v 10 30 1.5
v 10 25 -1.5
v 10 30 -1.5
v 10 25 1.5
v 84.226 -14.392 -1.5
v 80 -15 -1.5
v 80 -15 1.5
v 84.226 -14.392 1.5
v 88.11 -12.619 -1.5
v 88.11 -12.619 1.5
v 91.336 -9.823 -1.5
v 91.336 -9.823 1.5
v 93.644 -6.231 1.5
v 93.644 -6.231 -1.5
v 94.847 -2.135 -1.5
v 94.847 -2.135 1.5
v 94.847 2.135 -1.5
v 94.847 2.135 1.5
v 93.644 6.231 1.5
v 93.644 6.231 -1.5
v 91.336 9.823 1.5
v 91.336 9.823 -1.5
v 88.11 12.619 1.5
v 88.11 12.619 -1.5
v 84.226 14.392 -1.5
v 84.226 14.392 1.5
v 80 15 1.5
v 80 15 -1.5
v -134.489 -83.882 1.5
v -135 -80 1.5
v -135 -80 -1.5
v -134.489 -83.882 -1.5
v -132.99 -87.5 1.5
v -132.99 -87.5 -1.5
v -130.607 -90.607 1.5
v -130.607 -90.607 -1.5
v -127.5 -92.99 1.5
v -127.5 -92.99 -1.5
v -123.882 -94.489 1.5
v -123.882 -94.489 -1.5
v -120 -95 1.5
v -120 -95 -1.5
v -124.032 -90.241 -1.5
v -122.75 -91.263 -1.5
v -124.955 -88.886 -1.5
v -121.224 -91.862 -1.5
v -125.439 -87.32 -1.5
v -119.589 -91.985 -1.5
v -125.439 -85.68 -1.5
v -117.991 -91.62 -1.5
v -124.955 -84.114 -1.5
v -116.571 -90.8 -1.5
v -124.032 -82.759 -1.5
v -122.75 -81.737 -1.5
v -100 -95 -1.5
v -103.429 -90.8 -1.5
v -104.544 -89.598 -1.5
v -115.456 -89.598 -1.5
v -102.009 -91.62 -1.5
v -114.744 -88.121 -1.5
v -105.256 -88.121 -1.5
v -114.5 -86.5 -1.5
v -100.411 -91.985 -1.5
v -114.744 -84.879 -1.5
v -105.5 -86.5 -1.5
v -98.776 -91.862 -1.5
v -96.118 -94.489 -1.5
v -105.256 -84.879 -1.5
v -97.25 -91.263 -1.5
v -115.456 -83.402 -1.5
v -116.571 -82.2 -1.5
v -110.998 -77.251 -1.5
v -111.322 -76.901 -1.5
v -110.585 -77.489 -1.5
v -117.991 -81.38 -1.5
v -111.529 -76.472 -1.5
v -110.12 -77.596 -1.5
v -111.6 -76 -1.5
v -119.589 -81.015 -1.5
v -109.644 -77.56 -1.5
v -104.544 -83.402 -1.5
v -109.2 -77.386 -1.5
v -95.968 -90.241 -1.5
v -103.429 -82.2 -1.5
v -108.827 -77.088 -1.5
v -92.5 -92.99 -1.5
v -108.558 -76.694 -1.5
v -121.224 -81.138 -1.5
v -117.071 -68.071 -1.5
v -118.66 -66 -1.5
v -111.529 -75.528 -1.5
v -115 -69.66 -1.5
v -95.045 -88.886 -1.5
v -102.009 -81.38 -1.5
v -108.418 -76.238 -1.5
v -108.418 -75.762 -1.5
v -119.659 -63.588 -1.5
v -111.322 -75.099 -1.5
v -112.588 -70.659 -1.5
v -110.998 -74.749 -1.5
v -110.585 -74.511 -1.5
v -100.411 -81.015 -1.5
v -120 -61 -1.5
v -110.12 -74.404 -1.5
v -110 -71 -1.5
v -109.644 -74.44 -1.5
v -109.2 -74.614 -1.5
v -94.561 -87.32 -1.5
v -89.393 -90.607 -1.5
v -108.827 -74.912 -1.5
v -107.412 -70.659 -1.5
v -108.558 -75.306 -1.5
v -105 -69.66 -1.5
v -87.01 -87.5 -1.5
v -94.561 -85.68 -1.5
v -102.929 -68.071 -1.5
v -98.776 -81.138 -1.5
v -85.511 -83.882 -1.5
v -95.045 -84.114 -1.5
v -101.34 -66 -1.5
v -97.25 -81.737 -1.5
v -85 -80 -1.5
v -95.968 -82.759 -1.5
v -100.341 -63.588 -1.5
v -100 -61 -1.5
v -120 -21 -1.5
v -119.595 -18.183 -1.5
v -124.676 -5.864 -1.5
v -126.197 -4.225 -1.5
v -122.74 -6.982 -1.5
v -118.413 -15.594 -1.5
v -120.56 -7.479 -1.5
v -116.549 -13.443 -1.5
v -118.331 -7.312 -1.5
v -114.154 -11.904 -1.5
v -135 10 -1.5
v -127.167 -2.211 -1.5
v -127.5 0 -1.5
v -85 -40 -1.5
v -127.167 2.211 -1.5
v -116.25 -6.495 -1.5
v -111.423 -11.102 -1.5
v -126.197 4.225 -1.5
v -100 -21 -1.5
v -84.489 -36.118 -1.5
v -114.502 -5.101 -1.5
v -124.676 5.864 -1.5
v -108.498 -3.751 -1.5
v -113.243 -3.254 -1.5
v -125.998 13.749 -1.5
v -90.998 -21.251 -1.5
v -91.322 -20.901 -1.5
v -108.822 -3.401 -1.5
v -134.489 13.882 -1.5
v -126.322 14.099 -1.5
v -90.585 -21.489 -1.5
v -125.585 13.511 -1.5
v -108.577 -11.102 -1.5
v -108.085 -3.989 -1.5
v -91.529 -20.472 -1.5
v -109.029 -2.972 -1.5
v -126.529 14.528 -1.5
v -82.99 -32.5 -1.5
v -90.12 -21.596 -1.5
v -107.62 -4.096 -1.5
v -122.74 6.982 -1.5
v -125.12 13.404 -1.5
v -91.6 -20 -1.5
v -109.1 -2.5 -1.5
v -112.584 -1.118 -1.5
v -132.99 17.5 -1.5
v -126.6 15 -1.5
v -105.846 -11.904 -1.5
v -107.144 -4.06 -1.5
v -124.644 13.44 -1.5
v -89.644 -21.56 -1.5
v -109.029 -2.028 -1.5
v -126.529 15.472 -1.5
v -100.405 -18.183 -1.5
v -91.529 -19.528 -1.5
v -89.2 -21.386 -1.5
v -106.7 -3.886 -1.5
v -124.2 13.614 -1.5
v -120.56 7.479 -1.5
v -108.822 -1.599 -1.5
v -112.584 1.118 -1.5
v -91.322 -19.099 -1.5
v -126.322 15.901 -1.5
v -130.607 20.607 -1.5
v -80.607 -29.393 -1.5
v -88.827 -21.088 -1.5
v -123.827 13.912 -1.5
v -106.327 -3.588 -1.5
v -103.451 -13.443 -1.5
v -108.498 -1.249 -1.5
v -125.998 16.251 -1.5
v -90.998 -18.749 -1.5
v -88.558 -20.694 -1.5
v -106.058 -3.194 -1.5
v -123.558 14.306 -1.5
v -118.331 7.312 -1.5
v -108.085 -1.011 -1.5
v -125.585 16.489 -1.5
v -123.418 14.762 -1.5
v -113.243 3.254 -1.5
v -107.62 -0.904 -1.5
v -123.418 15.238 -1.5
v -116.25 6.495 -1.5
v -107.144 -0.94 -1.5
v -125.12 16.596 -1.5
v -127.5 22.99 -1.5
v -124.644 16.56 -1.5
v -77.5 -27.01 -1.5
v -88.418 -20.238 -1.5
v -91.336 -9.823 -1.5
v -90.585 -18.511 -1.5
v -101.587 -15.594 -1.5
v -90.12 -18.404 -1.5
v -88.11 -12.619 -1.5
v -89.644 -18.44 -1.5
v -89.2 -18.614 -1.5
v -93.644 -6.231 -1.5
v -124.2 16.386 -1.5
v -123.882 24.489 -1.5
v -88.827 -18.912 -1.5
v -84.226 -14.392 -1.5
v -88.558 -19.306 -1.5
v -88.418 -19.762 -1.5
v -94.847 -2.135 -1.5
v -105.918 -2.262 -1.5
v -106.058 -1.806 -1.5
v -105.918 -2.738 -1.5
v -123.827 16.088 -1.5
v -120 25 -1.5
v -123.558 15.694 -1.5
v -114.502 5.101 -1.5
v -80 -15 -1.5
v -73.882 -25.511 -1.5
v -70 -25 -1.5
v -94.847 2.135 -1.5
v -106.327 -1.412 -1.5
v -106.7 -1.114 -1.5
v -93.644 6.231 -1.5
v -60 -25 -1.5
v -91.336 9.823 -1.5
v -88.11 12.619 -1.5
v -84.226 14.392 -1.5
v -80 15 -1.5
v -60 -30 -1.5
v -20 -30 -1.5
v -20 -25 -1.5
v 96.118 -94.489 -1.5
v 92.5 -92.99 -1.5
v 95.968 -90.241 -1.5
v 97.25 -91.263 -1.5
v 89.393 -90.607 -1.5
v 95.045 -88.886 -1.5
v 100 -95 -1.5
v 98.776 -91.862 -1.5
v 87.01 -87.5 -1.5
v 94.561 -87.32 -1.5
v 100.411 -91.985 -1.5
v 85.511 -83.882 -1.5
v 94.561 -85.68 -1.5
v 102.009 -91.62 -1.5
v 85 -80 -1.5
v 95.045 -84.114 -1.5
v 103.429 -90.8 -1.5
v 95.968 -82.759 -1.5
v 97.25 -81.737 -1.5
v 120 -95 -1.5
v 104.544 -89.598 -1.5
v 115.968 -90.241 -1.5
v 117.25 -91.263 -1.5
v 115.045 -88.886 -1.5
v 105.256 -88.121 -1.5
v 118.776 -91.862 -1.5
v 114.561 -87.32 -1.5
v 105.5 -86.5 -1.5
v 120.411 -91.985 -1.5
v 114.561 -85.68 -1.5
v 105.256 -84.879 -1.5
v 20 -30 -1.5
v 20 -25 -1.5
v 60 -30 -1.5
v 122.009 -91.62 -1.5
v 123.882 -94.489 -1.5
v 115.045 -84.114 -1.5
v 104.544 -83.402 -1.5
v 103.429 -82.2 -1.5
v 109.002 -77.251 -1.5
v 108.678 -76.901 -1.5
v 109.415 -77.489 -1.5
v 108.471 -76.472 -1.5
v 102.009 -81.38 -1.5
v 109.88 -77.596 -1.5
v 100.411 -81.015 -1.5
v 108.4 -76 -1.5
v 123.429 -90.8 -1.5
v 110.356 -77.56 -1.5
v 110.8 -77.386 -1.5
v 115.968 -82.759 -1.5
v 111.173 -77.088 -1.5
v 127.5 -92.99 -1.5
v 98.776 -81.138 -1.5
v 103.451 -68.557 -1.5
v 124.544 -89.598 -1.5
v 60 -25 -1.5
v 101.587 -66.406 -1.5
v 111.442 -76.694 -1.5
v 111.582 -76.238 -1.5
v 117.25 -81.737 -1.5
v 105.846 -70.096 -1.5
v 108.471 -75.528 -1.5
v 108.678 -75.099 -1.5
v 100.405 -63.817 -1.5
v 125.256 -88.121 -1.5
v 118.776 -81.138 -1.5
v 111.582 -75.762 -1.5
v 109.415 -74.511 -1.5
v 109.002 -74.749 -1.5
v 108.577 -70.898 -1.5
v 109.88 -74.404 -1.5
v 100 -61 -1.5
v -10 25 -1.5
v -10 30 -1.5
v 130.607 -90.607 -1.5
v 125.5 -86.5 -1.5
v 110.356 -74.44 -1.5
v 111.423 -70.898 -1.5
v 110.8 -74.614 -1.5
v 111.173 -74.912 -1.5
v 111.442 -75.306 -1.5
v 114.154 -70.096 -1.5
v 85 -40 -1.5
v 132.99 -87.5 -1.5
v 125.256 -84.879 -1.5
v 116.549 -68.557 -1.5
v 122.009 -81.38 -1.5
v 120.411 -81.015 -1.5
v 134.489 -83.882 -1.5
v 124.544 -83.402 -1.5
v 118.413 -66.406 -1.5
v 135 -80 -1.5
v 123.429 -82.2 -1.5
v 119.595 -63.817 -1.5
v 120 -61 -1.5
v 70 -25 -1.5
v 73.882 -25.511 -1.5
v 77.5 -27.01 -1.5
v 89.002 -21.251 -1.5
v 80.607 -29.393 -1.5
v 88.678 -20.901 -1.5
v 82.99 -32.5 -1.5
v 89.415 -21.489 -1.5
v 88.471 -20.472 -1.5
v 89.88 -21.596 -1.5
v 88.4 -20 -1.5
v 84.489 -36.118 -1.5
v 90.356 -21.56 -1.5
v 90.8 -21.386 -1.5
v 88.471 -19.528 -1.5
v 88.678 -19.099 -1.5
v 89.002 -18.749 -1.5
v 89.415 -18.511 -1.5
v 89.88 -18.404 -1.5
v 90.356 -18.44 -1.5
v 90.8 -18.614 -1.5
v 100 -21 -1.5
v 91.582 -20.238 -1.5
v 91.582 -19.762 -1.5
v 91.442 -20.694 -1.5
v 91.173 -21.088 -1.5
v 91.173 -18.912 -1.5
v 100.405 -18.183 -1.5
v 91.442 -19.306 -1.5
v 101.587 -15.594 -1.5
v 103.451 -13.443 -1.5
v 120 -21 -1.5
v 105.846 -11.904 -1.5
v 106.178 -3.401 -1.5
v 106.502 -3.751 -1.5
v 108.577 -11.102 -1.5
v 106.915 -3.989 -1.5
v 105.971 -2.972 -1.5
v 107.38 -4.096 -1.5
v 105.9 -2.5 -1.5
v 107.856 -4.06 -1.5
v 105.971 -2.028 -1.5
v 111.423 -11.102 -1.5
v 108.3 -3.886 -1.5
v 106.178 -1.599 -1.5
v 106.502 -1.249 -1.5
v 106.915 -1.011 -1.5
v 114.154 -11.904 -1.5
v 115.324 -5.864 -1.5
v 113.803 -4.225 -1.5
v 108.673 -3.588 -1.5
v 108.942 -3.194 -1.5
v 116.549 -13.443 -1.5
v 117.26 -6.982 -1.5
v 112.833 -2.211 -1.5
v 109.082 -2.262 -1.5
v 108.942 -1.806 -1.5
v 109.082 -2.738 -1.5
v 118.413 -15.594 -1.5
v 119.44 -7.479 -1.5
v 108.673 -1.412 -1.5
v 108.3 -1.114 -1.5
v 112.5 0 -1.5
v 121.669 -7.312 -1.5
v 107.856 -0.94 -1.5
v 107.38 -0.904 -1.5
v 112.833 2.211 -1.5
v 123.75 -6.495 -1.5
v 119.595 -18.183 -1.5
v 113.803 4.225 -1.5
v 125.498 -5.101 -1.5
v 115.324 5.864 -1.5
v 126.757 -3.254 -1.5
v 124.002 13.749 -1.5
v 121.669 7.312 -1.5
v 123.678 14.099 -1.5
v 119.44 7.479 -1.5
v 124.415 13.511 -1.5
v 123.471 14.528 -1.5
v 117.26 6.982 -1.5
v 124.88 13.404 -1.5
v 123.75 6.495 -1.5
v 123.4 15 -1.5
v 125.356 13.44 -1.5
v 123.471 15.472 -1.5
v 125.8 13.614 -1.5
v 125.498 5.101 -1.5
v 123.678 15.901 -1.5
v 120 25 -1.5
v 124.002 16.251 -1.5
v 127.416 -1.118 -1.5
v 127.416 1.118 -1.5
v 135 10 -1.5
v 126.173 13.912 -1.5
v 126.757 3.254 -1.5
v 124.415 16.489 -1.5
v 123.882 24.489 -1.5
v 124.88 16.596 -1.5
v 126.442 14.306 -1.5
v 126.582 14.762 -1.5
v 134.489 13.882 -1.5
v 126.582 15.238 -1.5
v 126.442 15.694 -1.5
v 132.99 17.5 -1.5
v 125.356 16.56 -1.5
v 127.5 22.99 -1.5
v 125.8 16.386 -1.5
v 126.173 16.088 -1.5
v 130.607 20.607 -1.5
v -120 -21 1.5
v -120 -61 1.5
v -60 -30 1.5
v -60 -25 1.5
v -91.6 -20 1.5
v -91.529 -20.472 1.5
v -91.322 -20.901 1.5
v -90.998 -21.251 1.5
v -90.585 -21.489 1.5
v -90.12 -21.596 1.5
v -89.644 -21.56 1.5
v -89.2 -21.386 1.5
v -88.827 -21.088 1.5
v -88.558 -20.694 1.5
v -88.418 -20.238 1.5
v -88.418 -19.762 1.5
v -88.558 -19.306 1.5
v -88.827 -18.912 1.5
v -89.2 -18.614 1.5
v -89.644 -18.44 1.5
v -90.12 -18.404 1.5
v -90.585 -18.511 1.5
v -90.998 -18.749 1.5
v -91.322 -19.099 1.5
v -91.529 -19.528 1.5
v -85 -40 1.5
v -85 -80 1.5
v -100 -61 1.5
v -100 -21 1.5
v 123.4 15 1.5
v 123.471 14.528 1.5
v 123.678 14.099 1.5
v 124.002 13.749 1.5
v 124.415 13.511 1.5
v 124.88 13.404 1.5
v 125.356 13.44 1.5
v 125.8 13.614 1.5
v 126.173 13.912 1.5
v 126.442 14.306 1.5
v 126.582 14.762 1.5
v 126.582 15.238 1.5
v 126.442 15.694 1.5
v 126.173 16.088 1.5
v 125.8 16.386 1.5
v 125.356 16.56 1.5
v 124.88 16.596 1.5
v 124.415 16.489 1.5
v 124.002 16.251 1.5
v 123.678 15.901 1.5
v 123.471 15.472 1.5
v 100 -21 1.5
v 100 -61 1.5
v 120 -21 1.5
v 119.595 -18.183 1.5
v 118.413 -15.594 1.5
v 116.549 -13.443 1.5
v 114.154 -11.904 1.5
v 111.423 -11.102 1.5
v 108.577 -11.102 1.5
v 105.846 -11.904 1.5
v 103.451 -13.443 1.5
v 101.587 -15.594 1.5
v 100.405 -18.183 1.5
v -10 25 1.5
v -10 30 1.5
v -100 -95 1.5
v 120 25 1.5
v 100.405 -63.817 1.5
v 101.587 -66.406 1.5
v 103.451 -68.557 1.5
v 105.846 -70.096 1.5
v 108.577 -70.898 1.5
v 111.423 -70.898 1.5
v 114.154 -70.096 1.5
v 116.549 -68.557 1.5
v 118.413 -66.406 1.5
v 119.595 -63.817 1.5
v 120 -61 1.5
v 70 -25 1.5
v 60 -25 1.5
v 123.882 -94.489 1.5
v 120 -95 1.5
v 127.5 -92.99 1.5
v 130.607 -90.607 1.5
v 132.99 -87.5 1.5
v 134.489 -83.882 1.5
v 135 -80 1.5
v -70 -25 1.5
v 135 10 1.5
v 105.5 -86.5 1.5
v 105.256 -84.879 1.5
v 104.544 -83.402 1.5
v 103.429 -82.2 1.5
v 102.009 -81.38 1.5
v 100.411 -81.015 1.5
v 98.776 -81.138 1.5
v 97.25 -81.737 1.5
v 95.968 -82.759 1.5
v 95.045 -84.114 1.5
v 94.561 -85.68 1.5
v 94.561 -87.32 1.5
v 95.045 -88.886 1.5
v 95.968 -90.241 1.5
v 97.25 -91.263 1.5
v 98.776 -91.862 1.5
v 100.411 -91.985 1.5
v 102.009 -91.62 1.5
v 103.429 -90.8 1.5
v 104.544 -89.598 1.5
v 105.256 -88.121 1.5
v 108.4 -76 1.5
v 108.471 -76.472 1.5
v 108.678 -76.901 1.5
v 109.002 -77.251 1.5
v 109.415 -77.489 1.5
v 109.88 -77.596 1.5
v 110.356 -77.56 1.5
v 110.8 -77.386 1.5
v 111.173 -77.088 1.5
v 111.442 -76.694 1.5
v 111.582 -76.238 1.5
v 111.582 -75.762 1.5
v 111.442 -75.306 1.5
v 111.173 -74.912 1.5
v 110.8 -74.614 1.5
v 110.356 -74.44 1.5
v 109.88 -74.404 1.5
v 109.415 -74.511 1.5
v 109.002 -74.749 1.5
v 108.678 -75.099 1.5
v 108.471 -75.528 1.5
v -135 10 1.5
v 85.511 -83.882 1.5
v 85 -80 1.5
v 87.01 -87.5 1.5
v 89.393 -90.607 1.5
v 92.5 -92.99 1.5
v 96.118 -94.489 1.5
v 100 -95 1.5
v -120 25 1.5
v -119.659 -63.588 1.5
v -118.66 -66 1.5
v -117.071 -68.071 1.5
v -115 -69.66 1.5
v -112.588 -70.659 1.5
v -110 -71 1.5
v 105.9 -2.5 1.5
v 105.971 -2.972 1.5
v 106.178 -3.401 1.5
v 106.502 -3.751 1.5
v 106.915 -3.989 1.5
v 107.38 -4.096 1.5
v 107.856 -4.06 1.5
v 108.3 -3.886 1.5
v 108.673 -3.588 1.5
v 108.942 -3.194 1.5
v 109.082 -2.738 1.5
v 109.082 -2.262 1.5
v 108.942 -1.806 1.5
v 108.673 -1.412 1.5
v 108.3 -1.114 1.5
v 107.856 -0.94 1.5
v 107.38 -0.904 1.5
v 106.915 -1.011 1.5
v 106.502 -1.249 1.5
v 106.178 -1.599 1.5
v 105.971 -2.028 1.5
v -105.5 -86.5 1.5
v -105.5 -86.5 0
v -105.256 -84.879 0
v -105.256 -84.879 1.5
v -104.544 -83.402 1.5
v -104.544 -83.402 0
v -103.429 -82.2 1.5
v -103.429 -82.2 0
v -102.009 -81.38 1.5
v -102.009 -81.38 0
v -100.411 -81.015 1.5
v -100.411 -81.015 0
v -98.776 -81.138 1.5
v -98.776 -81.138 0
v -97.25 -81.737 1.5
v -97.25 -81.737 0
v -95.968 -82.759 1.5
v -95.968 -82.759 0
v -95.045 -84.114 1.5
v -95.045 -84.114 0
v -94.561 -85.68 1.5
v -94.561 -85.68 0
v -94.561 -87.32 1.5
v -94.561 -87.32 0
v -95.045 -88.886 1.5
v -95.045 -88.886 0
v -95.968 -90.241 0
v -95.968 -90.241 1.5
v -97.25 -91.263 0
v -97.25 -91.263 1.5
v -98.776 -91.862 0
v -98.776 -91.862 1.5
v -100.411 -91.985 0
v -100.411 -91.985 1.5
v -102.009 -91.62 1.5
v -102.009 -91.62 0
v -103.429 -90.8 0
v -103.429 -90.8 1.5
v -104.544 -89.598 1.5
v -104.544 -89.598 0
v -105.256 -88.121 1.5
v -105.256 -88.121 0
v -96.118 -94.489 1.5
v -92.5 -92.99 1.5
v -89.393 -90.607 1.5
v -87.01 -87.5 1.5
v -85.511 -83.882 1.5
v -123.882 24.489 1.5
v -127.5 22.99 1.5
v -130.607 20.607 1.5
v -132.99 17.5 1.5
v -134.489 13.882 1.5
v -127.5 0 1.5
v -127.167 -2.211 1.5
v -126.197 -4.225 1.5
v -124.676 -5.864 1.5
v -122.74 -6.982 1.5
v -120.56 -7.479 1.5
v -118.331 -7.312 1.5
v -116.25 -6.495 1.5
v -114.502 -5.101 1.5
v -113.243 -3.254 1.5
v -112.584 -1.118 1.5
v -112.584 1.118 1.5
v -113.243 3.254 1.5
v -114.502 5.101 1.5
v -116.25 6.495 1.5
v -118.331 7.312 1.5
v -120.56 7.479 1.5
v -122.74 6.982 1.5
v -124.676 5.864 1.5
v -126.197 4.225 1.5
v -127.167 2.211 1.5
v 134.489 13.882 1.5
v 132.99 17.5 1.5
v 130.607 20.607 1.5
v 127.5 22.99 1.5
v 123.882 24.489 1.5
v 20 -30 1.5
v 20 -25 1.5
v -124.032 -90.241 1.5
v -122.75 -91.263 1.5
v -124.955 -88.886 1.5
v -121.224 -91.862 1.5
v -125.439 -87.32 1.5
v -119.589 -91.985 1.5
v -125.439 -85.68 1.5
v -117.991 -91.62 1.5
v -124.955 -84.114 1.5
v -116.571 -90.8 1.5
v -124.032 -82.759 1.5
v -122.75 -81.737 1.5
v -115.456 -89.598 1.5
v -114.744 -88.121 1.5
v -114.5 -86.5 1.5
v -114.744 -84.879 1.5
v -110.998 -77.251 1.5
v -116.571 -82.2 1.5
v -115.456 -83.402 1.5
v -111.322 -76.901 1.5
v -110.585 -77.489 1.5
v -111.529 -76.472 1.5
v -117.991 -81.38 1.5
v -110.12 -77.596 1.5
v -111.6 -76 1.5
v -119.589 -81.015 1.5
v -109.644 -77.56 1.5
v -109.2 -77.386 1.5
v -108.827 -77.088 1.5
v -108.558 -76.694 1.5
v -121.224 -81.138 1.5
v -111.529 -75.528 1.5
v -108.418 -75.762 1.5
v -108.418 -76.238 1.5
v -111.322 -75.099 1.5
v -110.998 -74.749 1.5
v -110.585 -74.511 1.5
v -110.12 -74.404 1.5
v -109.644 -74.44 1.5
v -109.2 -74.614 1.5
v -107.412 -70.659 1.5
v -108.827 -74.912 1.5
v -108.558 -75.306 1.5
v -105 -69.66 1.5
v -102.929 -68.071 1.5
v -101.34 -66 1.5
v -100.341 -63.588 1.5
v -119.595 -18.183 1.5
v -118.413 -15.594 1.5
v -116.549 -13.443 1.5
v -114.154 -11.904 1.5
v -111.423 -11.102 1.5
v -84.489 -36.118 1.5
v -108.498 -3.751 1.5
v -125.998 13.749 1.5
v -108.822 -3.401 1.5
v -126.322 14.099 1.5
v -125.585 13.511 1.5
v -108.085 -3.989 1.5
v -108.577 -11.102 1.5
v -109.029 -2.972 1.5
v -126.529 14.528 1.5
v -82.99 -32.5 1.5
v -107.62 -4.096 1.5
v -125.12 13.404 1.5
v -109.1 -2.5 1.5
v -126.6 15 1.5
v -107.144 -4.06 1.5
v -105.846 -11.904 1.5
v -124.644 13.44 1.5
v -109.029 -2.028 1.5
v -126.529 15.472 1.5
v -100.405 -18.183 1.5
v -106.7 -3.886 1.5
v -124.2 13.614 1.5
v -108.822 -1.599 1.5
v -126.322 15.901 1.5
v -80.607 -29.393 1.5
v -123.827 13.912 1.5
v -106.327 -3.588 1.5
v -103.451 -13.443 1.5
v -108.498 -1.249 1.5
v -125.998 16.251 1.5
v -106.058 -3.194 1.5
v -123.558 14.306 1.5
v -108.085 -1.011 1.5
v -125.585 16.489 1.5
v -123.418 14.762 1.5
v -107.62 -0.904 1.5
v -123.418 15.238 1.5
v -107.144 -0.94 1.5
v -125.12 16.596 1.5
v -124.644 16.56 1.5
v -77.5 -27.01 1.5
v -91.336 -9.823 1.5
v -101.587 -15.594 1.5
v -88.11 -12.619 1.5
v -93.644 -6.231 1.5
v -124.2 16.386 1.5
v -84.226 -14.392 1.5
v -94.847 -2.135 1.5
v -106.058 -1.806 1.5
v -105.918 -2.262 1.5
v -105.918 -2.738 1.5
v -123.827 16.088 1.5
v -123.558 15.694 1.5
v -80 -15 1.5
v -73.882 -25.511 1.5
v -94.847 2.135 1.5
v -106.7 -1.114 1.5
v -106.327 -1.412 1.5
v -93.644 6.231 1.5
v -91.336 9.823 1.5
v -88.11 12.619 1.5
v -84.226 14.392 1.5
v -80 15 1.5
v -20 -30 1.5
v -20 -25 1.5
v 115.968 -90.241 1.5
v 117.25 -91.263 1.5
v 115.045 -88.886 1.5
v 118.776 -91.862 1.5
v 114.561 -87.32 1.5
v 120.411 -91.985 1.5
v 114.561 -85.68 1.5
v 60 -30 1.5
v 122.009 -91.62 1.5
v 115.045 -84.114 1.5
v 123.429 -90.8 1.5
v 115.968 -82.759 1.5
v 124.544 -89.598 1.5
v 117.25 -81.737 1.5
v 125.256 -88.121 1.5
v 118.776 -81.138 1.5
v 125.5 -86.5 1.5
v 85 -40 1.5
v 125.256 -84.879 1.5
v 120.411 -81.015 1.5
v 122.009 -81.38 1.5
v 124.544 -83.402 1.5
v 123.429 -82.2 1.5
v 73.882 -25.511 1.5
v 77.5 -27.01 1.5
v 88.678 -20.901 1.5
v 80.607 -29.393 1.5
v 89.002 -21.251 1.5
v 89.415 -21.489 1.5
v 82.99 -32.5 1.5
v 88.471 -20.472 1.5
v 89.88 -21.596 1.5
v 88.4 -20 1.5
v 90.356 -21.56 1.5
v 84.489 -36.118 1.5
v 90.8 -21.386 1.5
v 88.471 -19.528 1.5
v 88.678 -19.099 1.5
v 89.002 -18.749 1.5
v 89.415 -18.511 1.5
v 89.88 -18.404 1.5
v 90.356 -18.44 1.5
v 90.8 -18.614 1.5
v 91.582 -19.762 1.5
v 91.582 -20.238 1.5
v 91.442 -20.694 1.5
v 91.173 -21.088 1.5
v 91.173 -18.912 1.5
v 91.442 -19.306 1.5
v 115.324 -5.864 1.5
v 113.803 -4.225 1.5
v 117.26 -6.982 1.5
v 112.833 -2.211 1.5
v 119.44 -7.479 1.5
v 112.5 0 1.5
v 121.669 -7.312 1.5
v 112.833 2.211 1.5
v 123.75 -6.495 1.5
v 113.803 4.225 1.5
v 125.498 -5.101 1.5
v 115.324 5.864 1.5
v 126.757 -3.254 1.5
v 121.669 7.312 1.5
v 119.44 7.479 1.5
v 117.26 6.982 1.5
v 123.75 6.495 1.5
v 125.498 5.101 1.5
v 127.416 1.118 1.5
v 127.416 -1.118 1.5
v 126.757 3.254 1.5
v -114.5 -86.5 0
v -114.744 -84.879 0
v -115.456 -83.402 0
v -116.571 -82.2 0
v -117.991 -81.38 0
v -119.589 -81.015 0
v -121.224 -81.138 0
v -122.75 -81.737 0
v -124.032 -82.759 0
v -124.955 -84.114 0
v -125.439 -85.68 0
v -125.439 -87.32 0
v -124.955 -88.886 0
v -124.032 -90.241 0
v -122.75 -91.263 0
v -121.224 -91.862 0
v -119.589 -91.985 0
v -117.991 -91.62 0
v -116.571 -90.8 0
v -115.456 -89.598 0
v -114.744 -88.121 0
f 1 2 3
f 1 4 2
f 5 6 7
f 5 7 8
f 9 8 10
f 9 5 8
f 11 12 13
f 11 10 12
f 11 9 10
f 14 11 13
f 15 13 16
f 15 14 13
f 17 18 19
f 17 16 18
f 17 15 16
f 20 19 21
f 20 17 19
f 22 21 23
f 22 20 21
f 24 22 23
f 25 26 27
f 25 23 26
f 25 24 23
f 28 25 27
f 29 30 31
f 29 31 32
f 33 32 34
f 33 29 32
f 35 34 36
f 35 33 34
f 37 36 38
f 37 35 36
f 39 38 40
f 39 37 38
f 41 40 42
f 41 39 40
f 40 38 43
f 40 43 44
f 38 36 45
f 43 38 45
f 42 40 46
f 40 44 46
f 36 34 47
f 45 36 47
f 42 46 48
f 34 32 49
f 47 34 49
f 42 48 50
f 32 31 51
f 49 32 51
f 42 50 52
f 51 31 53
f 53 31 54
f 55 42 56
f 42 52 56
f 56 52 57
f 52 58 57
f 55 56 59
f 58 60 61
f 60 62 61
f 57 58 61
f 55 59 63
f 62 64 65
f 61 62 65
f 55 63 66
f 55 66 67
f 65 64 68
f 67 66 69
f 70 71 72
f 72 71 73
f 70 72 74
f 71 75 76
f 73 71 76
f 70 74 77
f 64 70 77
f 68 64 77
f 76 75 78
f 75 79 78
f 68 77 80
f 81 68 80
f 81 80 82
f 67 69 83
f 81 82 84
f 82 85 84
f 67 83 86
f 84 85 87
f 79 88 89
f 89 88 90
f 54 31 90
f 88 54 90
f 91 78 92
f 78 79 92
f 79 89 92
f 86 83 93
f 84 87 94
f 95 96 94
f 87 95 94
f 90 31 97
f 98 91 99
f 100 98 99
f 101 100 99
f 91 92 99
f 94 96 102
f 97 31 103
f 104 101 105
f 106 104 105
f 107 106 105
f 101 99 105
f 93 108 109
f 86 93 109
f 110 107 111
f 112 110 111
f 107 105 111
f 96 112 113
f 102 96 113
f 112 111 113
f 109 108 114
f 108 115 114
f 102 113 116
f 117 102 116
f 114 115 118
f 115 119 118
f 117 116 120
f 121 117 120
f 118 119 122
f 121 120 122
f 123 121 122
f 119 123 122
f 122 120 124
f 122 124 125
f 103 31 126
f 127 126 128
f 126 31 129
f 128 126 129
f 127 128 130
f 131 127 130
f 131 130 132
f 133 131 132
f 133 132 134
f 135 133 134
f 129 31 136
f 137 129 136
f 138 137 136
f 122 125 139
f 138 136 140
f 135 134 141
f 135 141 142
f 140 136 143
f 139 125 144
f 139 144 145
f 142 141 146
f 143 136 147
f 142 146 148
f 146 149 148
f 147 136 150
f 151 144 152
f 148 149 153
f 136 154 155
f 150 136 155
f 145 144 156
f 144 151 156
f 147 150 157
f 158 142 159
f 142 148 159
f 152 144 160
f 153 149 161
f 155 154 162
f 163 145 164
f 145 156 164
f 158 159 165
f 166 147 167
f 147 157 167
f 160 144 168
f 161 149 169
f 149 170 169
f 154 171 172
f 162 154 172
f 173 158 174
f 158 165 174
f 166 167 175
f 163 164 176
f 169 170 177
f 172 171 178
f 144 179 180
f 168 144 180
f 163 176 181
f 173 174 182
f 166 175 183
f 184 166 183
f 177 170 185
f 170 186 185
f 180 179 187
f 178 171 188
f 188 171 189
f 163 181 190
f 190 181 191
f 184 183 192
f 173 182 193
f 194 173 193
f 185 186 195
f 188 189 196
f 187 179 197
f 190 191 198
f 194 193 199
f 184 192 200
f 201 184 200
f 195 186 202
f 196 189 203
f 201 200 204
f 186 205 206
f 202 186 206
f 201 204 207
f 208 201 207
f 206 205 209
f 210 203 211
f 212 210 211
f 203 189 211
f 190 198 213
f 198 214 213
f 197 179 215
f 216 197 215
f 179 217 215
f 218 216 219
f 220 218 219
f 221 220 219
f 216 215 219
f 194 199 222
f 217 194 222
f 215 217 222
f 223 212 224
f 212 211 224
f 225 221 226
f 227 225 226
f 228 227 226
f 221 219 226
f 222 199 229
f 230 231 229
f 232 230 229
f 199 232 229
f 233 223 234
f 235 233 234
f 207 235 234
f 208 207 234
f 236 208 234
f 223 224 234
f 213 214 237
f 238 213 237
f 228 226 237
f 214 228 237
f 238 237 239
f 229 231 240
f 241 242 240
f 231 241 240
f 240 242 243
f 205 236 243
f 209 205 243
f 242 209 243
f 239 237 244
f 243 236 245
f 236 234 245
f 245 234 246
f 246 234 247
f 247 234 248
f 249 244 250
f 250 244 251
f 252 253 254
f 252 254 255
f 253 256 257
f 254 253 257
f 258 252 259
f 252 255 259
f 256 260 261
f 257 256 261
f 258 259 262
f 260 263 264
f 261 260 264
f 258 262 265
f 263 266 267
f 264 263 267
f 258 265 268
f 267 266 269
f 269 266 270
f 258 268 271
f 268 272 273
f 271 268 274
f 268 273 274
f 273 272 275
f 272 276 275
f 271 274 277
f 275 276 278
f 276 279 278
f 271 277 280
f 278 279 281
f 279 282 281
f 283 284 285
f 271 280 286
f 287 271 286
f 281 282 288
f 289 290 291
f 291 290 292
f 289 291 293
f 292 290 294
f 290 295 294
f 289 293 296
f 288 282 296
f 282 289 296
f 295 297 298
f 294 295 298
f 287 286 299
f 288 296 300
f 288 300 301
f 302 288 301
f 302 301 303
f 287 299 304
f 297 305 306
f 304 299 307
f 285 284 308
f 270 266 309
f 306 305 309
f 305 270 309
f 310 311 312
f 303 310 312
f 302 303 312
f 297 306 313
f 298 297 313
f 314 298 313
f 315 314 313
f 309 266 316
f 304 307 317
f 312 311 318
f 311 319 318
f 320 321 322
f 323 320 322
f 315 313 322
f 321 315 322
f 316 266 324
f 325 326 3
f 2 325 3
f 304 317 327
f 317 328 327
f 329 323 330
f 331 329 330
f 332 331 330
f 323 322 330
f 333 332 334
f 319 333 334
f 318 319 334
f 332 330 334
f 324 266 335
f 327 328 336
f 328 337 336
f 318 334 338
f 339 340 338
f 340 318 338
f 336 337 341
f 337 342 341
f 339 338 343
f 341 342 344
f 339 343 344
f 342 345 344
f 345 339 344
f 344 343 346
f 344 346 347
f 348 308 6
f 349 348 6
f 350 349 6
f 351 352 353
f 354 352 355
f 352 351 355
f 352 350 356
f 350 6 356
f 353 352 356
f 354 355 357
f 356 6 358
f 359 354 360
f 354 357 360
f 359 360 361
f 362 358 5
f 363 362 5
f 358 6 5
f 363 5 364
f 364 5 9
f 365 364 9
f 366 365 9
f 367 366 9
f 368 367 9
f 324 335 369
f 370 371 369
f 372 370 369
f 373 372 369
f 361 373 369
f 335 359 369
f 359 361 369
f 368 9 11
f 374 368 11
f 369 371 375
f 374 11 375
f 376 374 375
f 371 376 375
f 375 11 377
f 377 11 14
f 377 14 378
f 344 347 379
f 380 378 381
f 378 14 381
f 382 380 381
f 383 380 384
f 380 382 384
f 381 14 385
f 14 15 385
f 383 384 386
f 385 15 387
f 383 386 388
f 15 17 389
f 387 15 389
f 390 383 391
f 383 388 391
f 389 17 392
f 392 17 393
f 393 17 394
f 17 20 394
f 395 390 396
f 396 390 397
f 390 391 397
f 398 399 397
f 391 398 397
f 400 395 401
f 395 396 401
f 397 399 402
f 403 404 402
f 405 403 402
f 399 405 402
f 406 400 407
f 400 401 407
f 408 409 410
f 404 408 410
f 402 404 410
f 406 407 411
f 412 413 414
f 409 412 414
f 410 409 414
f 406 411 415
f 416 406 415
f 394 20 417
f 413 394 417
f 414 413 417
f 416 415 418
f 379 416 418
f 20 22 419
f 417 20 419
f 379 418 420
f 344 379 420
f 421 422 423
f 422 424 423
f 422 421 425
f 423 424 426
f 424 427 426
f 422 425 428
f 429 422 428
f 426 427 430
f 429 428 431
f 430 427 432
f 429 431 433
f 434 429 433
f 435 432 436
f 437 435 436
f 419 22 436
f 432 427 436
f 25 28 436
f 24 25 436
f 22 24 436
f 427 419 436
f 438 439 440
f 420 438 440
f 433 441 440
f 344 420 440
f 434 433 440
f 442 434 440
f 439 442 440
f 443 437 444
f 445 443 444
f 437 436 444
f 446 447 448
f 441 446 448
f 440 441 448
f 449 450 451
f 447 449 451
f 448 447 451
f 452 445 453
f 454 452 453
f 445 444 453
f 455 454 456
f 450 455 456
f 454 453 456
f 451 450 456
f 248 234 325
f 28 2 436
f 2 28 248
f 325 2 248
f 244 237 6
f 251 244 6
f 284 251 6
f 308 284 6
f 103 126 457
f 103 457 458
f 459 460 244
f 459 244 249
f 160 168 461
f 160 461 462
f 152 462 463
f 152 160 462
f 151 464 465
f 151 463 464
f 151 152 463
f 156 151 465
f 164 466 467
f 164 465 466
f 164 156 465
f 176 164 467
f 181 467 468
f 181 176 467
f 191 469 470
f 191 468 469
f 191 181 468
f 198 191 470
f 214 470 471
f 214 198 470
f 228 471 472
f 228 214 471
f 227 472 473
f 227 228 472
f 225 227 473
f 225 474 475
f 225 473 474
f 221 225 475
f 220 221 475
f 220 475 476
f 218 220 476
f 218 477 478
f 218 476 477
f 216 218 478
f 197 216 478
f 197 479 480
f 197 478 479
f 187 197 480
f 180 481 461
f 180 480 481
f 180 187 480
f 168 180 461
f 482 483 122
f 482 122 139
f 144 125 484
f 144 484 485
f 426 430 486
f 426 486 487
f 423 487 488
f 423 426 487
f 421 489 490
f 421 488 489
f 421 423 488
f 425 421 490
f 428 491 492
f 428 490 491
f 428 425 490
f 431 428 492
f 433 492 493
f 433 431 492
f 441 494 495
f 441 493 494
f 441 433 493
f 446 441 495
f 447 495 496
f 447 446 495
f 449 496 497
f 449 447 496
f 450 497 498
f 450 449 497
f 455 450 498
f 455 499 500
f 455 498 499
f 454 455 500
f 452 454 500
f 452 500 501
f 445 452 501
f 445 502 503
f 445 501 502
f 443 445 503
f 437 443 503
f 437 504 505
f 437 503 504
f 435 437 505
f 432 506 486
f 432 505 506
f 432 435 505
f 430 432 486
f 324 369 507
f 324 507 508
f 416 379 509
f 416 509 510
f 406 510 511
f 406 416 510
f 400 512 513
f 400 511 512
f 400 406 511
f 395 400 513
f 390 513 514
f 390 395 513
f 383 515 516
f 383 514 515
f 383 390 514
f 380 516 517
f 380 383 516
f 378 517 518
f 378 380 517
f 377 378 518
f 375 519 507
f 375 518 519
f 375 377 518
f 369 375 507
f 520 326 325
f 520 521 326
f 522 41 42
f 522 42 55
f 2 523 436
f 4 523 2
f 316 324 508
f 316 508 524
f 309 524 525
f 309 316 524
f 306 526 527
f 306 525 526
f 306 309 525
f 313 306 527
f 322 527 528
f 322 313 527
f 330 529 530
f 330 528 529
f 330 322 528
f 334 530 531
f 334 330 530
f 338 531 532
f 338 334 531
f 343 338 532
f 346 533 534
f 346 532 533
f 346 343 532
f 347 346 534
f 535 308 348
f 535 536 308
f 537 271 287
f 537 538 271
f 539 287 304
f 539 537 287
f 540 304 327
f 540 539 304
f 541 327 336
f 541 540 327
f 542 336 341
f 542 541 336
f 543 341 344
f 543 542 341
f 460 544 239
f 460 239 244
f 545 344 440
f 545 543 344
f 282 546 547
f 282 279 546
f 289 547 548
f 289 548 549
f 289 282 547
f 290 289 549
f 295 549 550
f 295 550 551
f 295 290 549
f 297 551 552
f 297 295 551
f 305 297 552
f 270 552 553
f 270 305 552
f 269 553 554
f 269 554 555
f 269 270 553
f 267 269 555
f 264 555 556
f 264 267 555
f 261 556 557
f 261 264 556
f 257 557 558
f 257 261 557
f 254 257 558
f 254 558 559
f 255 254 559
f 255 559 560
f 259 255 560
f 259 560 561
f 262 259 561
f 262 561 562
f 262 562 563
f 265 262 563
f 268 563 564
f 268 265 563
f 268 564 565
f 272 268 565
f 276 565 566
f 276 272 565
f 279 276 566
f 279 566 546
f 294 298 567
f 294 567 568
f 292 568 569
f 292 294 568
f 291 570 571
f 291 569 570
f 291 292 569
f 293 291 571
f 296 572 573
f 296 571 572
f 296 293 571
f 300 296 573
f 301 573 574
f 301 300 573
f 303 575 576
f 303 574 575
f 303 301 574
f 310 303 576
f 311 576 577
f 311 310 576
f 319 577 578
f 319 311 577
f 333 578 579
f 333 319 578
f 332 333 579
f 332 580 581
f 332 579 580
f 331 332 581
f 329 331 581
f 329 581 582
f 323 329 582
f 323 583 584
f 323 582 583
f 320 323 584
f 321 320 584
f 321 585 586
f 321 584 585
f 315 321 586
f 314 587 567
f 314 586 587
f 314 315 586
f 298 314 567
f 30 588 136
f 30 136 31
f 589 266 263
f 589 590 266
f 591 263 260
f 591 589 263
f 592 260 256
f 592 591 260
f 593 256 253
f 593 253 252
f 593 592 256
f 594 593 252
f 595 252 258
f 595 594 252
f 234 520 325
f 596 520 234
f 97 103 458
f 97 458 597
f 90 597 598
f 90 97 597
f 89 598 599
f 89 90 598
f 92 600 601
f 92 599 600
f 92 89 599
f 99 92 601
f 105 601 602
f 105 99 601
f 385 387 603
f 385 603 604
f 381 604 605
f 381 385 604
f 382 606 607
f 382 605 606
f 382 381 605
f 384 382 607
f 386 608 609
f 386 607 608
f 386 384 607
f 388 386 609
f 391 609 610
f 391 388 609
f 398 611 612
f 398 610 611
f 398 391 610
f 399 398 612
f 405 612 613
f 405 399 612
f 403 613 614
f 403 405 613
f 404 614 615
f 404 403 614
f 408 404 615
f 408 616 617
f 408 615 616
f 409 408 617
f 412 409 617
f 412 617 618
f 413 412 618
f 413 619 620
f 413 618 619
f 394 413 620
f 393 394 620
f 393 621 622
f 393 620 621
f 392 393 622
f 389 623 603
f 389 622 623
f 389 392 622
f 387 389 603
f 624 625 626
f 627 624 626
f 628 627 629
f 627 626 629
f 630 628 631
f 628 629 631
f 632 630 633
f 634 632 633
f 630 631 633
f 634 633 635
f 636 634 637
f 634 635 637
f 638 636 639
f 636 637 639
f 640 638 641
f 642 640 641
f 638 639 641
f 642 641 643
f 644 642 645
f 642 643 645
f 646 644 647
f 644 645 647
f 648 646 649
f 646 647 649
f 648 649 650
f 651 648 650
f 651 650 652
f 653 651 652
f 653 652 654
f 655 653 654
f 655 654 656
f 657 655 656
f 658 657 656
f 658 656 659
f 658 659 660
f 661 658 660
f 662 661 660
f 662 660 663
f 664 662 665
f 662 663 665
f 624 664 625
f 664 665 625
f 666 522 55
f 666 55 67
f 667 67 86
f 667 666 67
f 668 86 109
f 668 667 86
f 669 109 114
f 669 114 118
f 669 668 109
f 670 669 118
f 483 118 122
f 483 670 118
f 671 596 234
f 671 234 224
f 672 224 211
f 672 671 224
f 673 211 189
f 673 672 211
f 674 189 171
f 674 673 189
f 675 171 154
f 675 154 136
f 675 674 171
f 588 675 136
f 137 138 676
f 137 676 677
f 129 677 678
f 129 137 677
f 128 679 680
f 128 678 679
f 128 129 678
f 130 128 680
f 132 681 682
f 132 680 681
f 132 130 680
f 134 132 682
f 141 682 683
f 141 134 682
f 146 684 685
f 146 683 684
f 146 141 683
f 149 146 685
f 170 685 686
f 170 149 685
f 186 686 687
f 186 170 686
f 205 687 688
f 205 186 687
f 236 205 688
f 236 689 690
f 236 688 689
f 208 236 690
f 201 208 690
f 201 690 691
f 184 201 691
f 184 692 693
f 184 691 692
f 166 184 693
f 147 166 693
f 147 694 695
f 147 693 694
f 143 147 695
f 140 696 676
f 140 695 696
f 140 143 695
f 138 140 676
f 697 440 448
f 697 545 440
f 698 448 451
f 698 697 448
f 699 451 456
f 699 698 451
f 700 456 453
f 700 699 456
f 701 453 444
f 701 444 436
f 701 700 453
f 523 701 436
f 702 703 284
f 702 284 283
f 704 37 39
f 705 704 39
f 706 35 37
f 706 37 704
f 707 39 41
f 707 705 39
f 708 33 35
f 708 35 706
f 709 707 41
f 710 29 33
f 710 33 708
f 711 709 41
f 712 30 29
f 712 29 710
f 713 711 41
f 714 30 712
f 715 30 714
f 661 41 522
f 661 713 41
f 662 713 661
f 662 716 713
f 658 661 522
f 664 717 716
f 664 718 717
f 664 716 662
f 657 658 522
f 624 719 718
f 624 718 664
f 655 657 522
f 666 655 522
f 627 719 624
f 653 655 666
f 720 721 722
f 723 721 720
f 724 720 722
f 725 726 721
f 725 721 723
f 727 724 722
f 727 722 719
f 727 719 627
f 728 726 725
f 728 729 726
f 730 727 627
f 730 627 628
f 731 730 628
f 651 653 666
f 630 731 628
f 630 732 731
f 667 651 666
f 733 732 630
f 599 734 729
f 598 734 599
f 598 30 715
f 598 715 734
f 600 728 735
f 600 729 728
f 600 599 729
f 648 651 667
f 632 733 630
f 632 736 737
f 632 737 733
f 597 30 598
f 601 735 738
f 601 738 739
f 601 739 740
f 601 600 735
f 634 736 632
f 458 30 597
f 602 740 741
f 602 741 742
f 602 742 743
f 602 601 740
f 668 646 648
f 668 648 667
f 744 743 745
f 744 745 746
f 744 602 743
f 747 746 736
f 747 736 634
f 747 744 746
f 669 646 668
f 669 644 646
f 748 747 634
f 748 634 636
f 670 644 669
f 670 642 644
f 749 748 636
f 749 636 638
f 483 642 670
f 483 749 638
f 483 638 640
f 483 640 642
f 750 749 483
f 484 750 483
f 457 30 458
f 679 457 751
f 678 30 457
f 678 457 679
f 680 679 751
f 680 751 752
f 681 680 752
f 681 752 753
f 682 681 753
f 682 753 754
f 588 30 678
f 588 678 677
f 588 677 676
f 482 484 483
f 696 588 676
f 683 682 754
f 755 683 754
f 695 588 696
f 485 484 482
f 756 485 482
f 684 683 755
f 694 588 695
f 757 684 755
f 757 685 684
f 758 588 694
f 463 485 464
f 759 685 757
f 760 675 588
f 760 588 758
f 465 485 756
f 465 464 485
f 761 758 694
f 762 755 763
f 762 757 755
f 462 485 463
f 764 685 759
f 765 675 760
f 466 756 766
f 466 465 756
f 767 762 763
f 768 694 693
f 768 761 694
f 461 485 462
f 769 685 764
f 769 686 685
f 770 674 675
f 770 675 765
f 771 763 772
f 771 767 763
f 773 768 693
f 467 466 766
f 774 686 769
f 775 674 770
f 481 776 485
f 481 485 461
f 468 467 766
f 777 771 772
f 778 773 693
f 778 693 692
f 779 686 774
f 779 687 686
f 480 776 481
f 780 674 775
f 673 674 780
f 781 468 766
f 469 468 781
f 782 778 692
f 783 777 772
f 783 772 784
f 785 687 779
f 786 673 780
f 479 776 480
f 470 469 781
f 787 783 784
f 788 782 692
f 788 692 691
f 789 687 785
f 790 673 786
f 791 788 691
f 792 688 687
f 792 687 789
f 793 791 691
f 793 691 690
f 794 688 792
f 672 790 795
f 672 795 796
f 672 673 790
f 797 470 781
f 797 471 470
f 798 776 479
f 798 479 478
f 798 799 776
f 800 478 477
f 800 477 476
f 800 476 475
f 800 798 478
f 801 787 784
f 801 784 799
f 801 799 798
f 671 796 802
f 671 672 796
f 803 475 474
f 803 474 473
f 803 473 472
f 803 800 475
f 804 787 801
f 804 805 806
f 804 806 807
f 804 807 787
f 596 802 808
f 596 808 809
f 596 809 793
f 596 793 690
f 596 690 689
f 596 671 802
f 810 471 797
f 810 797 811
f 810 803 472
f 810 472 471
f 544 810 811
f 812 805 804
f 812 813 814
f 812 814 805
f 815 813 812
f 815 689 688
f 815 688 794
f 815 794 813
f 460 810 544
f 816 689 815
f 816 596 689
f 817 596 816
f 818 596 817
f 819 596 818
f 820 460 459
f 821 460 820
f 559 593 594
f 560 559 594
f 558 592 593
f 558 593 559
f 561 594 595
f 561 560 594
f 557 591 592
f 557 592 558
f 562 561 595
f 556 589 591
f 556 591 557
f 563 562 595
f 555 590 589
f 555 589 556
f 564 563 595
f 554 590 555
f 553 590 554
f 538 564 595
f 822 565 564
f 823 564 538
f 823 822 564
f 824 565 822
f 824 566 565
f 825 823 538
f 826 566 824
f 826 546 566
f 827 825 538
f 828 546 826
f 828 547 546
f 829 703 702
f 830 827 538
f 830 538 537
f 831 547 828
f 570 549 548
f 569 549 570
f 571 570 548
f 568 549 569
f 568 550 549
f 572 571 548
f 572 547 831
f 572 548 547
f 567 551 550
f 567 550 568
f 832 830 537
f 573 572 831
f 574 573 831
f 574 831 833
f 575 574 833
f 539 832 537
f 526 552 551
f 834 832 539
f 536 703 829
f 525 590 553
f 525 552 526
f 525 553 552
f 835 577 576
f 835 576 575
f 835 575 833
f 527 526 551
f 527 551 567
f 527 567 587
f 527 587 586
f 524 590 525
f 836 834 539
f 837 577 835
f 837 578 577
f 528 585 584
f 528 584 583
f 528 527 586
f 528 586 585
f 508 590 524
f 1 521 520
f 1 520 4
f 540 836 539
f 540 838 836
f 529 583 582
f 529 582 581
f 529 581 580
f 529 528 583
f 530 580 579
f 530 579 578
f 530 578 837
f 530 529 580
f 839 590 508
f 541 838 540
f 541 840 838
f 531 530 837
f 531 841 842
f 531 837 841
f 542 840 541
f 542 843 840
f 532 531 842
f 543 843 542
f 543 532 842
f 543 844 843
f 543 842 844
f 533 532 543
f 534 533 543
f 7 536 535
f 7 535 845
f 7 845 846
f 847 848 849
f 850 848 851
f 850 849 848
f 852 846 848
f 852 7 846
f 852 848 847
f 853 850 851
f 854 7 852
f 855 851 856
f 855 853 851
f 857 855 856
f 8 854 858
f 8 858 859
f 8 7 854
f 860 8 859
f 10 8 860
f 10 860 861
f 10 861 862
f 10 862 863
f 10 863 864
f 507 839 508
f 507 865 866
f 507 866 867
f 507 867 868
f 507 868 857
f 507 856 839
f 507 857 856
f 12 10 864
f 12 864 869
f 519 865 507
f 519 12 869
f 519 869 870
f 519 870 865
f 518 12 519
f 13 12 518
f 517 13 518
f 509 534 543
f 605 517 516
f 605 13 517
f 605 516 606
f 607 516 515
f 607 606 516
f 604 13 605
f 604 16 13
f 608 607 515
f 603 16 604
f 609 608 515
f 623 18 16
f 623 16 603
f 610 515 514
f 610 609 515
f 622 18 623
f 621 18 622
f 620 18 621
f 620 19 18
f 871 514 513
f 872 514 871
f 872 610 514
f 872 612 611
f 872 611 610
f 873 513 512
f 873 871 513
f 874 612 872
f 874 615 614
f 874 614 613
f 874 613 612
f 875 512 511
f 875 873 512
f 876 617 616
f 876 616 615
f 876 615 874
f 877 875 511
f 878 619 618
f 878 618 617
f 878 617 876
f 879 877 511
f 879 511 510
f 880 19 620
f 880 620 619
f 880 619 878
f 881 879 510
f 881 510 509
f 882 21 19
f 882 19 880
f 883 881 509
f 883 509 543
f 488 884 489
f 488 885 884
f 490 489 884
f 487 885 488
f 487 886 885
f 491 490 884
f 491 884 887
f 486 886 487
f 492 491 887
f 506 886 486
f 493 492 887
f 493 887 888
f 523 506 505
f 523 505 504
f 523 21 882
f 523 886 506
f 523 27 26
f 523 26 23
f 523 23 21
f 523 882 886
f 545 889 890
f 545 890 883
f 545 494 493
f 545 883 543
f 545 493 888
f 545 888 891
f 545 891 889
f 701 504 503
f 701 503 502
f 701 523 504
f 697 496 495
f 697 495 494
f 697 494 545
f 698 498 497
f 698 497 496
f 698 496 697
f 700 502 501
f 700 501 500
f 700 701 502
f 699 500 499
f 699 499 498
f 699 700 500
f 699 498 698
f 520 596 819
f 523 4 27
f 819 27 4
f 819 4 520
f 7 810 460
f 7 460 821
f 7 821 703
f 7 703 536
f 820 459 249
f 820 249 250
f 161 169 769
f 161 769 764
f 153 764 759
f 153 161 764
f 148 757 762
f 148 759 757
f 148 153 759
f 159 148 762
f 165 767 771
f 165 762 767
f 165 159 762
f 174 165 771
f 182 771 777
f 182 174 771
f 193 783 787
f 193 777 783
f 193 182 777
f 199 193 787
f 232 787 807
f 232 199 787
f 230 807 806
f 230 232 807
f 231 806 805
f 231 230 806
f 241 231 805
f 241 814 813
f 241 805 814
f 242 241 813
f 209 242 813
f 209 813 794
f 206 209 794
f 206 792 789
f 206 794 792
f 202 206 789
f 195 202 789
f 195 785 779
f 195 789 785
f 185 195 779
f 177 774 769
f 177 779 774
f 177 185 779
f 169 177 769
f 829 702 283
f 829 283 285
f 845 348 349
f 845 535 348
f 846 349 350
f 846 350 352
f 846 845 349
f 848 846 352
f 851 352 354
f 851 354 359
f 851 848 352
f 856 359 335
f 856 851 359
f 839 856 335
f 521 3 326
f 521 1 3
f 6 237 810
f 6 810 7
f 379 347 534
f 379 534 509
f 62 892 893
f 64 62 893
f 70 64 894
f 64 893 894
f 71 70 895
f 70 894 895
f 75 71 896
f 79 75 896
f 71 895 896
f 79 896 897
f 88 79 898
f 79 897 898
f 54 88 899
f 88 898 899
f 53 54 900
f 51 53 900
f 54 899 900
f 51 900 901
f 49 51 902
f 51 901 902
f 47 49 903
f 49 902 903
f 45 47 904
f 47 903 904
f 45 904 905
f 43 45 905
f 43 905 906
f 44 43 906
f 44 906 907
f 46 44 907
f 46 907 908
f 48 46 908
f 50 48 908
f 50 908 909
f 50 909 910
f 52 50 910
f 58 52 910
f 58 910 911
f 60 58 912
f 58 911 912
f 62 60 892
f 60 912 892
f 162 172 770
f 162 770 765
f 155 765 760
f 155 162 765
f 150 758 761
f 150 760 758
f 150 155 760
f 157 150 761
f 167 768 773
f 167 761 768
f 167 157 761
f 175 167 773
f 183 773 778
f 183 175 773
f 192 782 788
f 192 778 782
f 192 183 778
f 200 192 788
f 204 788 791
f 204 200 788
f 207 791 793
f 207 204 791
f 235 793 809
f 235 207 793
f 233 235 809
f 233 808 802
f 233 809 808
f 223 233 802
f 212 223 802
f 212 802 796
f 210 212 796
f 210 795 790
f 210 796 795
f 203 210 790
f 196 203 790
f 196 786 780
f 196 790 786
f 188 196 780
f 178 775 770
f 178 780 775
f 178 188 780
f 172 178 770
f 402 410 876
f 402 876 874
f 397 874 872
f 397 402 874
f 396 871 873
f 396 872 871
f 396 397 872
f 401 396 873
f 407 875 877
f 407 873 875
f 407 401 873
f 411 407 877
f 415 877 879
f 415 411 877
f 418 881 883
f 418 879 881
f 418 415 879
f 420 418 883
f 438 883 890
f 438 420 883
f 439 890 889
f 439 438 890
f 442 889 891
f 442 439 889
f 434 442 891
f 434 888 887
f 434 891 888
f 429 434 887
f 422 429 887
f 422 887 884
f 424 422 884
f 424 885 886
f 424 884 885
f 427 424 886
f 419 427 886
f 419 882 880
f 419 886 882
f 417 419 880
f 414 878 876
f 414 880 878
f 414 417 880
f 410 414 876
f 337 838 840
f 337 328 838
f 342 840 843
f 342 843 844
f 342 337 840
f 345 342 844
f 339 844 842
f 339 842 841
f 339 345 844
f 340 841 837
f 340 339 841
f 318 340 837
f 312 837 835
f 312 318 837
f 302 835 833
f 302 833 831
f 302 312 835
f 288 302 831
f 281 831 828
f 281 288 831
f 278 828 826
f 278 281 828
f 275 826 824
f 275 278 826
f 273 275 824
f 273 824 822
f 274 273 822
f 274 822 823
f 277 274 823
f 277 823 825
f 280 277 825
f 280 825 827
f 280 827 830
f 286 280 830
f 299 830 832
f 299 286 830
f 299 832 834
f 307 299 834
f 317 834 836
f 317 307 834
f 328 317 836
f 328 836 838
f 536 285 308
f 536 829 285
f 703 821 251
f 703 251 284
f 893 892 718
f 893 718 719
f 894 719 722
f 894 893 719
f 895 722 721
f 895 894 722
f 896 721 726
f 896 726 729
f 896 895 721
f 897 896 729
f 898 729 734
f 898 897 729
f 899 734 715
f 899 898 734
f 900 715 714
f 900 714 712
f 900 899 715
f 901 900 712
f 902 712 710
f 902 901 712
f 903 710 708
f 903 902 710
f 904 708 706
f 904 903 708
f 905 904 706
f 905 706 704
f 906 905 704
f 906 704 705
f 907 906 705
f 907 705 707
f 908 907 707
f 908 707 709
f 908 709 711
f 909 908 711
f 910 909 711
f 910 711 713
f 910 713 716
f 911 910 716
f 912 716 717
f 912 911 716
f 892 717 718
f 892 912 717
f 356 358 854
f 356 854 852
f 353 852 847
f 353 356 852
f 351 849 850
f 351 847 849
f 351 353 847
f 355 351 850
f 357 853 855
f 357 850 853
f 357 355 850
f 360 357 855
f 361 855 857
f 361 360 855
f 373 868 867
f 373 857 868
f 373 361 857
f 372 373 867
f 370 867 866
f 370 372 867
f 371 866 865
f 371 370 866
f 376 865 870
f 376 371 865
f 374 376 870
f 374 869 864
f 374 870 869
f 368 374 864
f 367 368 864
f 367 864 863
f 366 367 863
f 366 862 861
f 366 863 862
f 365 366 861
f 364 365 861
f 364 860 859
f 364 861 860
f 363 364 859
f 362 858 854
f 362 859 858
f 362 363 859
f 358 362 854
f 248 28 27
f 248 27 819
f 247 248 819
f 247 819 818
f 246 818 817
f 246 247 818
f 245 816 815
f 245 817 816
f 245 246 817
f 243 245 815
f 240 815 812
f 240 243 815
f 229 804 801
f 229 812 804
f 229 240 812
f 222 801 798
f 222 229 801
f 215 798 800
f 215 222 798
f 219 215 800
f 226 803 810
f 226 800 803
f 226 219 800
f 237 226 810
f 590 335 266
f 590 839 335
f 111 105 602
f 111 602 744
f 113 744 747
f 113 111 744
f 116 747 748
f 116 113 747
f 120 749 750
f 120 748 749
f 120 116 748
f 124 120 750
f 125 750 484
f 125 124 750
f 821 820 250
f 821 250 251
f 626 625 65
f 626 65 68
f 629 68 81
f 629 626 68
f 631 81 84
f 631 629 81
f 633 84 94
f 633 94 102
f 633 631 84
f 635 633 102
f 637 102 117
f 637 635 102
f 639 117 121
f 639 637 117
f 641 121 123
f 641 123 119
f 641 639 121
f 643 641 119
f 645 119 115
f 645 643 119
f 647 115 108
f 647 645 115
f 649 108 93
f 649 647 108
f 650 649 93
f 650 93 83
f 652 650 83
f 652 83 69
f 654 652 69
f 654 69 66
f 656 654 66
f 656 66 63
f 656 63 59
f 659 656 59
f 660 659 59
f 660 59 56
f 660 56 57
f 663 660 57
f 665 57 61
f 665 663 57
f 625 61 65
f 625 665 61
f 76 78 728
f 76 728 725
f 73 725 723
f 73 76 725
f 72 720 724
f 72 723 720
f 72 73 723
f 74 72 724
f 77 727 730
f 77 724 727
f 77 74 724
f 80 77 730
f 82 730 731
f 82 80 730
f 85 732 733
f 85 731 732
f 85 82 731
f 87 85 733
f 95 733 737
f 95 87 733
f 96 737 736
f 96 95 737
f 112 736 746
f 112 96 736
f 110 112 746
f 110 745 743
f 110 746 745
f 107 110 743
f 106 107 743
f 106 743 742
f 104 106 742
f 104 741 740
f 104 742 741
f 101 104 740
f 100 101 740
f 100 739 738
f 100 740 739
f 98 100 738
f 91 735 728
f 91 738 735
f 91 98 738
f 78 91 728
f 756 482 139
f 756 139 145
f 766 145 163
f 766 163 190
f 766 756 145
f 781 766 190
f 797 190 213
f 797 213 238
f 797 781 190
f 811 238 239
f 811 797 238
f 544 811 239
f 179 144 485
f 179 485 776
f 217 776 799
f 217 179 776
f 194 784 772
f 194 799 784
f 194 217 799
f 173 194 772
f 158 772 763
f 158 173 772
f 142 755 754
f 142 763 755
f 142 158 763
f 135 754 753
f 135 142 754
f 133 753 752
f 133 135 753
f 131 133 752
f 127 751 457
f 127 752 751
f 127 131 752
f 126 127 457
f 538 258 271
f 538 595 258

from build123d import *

# Parameters (mm, degrees)
SKETCH_1_R               = 5.5
EXTRUDE_1_DEPTH          = 1.5
CUT_EXTRUDE_1_DEPTH      = 166.102998156
CUT_EXTRUDE_1_DEPTH_BACK = 10
SKETCH_2_R               = 1.6
SKETCH_2_R_2             = 7.5


with BuildPart() as part:
    # 草图1 → 凸台-拉伸1 (new, symmetric)
    with BuildSketch(Plane.XY):
        with BuildLine():
            Line((-10, 25), (-120, 25))
            ThreePointArc((-120, 25), (-130.606601718, 20.606601718), (-135, 10))
            Line((-135, 10), (-135, -35))
            Line((-135, -35), (-135, -80))
            ThreePointArc((-135, -80), (-130.606601718, -90.606601718), (-120, -95))
            Line((-120, -95), (-110, -95))
            Line((-110, -95), (-100, -95))
            ThreePointArc((-100, -95), (-89.393398282, -90.606601718), (-85, -80))
            Line((-85, -80), (-85, -40))
            ThreePointArc((-85, -40), (-80.606601718, -29.393398282), (-70, -25))
            Line((-70, -25), (-60, -25))
            Line((-60, -25), (-60, -30))
            Line((-60, -30), (-45, -30))
            Line((-45, -30), (-20, -30))
            Line((-20, -30), (-20, -25))
            Line((-20, -25), (0, -25))
            Line((0, -25), (20, -25))
            Line((20, -25), (20, -30))
            Line((20, -30), (45, -30))
            Line((45, -30), (60, -30))
            Line((60, -30), (60, -25))
            Line((60, -25), (70, -25))
            ThreePointArc((70, -25), (80.606601718, -29.393398282), (85, -40))
            Line((85, -40), (85, -80))
            ThreePointArc((85, -80), (89.393398282, -90.606601718), (100, -95))
            Line((100, -95), (120, -95))
            ThreePointArc((120, -95), (130.606601718, -90.606601718), (135, -80))
            Line((135, -80), (135, -35))
            Line((135, -35), (135, 10))
            ThreePointArc((135, 10), (130.606601718, 20.606601718), (120, 25))
            Line((120, 25), (10, 25))
            Line((10, 25), (10, 30))
            Line((10, 30), (-10, 30))
            Line((-10, 30), (-10, 25))
        make_face()
        with Locations((-120, -86.5)):
            Circle(SKETCH_1_R, mode=Mode.SUBTRACT)
        with BuildLine():
            ThreePointArc((-94.5, -86.5), (-100, -92), (-105.5, -86.5))
            ThreePointArc((-105.5, -86.5), (-100, -81), (-94.5, -86.5))
        make_face(mode=Mode.SUBTRACT)
        with Locations((100, -86.5)):
            Circle(SKETCH_1_R, mode=Mode.SUBTRACT)
        with Locations((120, -86.5)):
            Circle(SKETCH_1_R, mode=Mode.SUBTRACT)
    extrude(amount=EXTRUDE_1_DEPTH, both=True)

    # 草图2 → 切除-拉伸1 (cut, two sides: drawn at the far end of the back side and taken through both)
    with BuildSketch(Plane.XY.offset(1.5).offset(-CUT_EXTRUDE_1_DEPTH_BACK)):
        with BuildLine():
            Line((80, 15), (-80, 15))
            ThreePointArc((-80, 15), (-95, 0), (-80, -15))
            Line((-80, -15), (80, -15))
            ThreePointArc((80, -15), (95, 0), (80, 15))
        make_face()
        with Locations(Location((-110, -76, 0), (0, 0, 180))):
            Circle(SKETCH_2_R)
        with BuildLine():
            ThreePointArc((-120, -61), (-117.071067812, -68.071067812), (-110, -71))
            ThreePointArc((-110, -71), (-102.928932188, -68.071067812), (-100, -61))
            Line((-100, -61), (-100, -21))
            ThreePointArc((-100, -21), (-110, -11), (-120, -21))
            Line((-120, -21), (-120, -61))
        make_face()
        with Locations(Location((-90, -20, 0), (0, 0, 180))):
            Circle(SKETCH_2_R)
        with BuildLine():
            ThreePointArc((120, -21), (110, -11), (100, -21))
            Line((100, -21), (100, -61))
            ThreePointArc((100, -61), (110, -71), (120, -61))
            Line((120, -61), (120, -21))
        make_face()
        with Locations(Location((-107.5, -2.5, 0), (0, 0, 180))):
            Circle(SKETCH_2_R)
        with Locations(Location((90, -20, 0), (0, 0, 180))):
            Circle(SKETCH_2_R)
        with Locations(Location((107.5, -2.5, 0), (0, 0, 180))):
            Circle(SKETCH_2_R)
        with Locations(Location((-125, 15, 0), (0, 0, 180))):
            Circle(SKETCH_2_R)
        with Locations(Location((-120, 0, 0), (0, 0, 180))):
            Circle(SKETCH_2_R_2)
        with Locations(Location((125, 15, 0), (0, 0, 180))):
            Circle(SKETCH_2_R)
        with Locations(Location((120, 0, 0), (0, 0, 180))):
            Circle(SKETCH_2_R_2)
        with Locations(Location((110, -76, 0), (0, 0, 180))):
            Circle(SKETCH_2_R)
    extrude(amount=CUT_EXTRUDE_1_DEPTH + CUT_EXTRUDE_1_DEPTH_BACK, mode=Mode.SUBTRACT)


solid = part.part
